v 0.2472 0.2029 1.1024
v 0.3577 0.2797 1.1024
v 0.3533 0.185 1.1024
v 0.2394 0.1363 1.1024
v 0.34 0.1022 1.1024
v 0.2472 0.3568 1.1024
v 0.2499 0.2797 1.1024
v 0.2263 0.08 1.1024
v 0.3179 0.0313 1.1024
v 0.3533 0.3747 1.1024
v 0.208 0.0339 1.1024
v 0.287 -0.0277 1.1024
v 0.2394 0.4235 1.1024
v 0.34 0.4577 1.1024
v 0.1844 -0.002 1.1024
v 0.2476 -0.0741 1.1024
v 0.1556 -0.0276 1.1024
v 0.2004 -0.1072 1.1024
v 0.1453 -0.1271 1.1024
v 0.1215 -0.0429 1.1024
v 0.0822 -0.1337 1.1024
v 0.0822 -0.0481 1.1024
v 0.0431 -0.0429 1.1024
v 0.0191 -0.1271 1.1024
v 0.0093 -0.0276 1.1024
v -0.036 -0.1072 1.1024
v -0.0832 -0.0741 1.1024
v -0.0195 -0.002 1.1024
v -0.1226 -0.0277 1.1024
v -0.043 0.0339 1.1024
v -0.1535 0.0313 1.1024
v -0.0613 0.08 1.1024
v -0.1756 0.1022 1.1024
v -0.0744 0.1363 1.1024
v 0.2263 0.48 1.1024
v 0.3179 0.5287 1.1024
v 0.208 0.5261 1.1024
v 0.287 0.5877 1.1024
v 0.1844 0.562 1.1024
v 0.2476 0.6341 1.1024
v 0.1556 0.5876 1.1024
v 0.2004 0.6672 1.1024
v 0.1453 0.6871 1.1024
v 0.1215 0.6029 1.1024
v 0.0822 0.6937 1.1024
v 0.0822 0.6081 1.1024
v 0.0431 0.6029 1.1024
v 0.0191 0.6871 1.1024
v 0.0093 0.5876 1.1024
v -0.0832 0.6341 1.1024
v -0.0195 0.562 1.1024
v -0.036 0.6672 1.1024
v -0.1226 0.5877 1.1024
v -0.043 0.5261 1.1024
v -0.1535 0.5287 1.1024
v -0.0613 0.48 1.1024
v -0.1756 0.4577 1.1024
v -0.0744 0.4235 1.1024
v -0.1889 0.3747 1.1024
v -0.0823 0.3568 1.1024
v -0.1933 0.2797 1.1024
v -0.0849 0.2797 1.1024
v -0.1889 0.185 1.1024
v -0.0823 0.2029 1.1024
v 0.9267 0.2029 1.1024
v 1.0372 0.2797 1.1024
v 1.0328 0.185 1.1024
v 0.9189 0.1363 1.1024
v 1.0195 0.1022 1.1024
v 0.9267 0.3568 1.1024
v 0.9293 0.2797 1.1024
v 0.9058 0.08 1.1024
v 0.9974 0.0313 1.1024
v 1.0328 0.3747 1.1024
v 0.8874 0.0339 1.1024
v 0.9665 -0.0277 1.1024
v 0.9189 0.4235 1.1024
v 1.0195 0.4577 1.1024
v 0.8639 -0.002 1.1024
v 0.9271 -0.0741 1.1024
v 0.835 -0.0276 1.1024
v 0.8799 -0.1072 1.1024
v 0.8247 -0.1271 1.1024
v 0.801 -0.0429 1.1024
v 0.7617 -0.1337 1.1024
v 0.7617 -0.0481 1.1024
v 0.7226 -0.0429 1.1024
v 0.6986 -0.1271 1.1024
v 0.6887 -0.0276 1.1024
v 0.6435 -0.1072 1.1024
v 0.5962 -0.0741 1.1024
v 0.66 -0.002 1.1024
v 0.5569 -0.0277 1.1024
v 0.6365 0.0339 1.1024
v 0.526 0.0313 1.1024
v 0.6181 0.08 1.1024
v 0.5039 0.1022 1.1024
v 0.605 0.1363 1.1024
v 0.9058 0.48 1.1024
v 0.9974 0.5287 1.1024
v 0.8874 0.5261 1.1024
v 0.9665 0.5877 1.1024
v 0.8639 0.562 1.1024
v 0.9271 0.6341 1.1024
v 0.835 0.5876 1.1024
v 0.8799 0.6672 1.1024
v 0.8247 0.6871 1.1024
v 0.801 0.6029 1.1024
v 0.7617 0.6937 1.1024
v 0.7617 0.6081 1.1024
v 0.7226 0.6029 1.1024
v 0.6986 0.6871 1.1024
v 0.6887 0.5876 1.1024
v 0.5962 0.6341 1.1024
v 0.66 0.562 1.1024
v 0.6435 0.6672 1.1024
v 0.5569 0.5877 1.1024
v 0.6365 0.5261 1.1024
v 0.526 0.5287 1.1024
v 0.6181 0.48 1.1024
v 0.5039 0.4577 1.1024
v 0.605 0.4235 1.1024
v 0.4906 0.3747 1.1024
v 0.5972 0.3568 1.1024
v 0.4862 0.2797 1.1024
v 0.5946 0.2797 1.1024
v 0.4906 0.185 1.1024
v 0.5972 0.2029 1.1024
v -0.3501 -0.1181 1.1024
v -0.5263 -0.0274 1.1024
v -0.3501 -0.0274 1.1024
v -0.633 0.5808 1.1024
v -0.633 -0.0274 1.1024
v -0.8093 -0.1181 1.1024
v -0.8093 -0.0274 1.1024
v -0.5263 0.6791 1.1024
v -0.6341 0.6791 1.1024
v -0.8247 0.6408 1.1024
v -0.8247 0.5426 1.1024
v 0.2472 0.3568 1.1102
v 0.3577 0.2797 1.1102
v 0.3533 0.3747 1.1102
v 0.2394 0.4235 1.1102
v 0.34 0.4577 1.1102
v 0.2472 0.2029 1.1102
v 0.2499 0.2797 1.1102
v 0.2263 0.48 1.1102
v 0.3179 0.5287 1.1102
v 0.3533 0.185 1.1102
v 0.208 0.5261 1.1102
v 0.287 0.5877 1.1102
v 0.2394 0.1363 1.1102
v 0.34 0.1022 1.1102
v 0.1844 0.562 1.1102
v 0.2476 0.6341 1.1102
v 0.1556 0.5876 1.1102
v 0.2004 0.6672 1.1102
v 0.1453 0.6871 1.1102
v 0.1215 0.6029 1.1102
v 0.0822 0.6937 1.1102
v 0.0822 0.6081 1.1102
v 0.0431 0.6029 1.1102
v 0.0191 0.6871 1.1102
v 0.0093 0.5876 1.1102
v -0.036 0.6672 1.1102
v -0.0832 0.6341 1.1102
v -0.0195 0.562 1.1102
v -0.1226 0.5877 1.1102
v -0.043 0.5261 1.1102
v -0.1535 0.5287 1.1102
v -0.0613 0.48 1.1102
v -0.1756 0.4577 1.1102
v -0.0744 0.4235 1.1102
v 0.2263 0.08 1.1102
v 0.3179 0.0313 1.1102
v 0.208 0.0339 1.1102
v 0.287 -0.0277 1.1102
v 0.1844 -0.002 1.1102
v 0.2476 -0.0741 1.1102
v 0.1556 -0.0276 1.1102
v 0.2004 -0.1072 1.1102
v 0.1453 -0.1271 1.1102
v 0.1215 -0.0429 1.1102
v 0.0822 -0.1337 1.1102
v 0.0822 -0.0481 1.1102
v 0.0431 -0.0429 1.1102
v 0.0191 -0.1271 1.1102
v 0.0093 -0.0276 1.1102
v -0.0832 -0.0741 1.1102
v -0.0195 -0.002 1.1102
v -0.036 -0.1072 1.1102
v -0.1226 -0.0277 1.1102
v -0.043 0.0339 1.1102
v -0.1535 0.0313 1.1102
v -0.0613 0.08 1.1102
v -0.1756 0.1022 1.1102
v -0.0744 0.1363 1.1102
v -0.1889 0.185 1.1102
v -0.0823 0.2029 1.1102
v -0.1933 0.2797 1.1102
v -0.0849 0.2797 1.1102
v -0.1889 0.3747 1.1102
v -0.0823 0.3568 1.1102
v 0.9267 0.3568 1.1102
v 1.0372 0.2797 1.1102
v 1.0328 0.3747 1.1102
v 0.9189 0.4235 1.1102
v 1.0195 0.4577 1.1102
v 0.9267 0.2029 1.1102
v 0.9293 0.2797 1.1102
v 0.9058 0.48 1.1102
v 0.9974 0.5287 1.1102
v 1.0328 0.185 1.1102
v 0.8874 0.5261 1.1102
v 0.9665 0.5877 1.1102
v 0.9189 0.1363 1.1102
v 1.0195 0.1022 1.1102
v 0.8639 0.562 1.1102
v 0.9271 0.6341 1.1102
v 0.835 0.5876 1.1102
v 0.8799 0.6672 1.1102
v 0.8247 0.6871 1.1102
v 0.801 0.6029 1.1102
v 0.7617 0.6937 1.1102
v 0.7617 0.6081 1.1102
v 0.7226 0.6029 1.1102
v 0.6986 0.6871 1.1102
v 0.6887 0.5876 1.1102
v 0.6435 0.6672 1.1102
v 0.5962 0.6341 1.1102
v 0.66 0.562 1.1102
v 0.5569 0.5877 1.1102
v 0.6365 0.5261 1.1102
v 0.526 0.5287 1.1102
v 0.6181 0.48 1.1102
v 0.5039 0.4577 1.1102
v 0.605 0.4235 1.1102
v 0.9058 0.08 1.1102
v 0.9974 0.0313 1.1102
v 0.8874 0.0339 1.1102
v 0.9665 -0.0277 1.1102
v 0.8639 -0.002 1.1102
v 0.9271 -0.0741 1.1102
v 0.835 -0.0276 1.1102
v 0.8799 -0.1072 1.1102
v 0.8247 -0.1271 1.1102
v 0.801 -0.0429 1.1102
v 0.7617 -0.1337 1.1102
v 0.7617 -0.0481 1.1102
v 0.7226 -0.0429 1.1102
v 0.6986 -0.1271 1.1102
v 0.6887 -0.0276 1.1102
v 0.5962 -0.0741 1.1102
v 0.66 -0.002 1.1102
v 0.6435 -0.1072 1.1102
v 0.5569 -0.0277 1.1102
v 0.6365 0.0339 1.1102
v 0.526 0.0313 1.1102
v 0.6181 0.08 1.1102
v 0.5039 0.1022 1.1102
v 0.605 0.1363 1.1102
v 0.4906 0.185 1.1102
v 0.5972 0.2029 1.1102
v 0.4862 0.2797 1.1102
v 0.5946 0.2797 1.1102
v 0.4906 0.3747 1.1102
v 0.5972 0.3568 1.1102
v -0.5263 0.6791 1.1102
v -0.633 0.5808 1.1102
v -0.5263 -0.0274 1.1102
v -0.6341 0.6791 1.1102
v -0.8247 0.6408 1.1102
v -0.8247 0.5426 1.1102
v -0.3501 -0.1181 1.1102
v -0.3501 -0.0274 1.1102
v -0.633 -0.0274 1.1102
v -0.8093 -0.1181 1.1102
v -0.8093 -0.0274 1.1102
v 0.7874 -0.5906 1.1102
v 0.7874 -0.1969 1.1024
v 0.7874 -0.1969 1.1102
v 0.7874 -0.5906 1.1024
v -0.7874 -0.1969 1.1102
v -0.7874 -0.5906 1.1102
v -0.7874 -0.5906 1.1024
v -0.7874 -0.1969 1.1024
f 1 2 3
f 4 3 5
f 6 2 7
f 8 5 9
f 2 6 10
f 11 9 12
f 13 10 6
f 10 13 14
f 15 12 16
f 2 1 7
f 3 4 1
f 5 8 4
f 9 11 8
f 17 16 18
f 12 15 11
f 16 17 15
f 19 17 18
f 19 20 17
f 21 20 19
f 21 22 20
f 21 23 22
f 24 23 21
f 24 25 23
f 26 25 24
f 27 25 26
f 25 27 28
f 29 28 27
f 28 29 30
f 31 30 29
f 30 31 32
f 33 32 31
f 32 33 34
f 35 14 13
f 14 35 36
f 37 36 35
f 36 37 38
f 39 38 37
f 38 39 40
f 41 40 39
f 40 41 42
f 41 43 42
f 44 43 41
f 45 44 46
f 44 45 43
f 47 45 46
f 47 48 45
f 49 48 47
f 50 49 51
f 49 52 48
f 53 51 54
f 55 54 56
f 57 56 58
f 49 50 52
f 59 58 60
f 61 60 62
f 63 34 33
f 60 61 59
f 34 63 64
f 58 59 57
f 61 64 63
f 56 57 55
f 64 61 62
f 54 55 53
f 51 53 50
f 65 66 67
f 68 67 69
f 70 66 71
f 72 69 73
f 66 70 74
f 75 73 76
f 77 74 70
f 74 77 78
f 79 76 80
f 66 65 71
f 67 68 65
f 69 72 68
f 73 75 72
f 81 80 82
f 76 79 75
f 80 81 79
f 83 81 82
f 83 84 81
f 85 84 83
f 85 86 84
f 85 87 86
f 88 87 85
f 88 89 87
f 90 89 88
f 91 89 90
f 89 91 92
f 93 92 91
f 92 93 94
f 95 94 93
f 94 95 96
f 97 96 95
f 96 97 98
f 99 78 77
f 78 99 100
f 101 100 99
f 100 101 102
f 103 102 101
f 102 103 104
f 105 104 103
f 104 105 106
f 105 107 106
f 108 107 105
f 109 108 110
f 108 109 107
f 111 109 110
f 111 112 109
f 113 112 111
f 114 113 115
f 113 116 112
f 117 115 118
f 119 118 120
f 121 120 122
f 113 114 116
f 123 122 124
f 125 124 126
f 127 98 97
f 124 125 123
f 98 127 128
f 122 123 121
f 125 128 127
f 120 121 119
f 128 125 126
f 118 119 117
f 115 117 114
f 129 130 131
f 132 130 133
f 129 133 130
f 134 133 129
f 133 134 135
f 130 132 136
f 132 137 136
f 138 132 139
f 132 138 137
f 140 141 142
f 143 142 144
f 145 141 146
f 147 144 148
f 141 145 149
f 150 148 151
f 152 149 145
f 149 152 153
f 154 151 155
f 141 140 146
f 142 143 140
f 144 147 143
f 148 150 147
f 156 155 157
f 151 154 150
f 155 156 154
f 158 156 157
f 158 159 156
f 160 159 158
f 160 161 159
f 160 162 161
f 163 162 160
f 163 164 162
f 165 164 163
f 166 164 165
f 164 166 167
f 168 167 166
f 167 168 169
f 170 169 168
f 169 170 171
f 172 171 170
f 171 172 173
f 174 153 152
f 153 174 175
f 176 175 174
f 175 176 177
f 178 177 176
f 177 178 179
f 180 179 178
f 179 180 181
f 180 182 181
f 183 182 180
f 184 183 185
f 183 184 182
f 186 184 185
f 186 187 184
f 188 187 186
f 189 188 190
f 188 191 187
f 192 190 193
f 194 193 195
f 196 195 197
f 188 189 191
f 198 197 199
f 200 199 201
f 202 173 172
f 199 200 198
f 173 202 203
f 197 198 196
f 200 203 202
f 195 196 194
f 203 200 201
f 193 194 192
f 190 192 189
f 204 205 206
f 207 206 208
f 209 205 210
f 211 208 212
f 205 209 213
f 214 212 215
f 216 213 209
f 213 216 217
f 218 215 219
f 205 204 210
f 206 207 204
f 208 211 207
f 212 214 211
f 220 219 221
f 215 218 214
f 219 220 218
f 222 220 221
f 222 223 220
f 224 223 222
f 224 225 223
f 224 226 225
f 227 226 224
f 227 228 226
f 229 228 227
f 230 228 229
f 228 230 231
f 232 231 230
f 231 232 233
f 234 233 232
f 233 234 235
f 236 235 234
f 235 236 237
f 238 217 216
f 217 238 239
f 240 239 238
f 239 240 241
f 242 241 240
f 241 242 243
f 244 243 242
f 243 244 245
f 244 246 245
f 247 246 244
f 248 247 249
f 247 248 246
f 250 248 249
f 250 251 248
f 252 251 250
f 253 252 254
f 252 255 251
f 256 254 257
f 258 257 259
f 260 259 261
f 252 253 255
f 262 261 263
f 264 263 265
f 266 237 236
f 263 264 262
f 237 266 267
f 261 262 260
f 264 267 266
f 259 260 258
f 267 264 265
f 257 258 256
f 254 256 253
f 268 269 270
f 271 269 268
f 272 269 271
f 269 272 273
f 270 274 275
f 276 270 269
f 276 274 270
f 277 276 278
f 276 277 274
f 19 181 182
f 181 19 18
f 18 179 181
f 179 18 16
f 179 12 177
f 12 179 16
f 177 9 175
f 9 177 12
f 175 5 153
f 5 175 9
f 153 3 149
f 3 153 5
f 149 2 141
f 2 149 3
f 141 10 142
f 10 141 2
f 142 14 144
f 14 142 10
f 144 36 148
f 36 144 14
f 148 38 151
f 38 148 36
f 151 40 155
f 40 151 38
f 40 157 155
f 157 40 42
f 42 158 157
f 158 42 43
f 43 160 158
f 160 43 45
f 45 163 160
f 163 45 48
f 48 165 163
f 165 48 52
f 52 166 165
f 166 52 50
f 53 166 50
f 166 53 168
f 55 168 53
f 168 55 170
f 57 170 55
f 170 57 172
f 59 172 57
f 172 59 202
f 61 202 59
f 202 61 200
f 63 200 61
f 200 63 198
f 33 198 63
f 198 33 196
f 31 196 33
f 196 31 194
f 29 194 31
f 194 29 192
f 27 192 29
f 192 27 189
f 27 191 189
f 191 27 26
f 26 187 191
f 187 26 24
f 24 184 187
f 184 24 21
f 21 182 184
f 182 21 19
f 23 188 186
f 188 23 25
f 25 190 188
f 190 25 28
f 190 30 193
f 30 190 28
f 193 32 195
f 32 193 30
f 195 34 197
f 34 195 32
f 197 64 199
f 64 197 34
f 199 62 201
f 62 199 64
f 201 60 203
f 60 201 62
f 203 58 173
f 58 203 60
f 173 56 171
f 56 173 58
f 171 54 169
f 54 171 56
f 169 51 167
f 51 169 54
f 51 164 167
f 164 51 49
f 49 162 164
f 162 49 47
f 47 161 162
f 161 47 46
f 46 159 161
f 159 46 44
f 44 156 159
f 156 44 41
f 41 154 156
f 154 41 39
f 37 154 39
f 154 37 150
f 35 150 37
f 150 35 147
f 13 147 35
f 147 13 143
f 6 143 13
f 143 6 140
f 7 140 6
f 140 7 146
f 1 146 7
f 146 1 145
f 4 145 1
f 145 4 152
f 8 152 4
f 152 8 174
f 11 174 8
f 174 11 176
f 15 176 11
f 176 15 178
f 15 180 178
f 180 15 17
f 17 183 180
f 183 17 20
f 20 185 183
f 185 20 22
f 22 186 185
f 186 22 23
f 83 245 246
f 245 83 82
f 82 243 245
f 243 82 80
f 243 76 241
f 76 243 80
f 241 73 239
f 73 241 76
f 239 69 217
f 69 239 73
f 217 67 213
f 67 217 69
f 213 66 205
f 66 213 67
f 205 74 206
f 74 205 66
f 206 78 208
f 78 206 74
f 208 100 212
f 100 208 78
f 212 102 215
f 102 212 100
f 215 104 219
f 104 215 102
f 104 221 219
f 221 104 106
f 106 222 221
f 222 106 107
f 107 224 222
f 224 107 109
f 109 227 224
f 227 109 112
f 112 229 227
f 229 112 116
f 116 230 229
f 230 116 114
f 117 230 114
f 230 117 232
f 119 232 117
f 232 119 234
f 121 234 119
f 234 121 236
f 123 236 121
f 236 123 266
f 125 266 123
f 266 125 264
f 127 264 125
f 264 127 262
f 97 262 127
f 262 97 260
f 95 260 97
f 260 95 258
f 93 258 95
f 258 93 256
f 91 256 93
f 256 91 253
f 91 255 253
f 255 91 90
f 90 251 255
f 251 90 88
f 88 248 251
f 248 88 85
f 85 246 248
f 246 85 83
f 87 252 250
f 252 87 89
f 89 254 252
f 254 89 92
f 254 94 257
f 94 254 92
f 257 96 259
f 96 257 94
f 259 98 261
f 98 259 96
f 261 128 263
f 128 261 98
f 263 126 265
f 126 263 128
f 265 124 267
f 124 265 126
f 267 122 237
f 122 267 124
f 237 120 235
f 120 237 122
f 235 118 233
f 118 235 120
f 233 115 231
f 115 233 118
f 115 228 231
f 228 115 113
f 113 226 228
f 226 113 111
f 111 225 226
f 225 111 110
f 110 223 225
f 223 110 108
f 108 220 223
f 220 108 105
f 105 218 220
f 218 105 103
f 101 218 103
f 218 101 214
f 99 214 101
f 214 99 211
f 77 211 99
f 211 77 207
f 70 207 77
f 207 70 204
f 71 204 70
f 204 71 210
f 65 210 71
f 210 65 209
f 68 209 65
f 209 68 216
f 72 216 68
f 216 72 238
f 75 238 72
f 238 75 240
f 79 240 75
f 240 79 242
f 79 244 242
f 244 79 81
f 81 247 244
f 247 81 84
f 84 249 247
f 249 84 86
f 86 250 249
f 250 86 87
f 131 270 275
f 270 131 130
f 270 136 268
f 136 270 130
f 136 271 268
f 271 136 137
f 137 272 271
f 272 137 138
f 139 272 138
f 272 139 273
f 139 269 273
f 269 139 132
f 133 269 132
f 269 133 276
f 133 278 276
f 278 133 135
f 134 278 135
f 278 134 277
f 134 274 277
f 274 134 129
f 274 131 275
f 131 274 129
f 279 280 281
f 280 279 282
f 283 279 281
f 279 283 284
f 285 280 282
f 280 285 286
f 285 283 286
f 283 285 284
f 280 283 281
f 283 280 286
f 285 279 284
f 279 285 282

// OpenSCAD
// file: defines.scad
// example012.stl is Mblock.stl, (c) 2009 Will Langford
// licensed under the Creative Commons - GNU GPL license.
// http://www.thingiverse.com/thing:753

//import("sim800c.stl", convexity=3);

// PCB

L = 6.0;
W = 6.0;
H = 2.8;
e = 1.35;
pin_fragments = 16;

scale = 1/2.54;
// main file
include <defines.scad>

/*font = "Liberation Sans";*/
/*font = "DejaVu";*/
font = "Abyssinica SIL";

// Label
scale(scale) color("White") {

    translate([-L/2.5, -W/20, H]) {
        scale(0.2)
        linear_extrude(height = 0.1, center=false) {
            text("100", font = font);
        }

    }
    translate([-L/3, -W/4, H]) {
        cube(size = [4, 1, 0.02], center = false);
    }

}
